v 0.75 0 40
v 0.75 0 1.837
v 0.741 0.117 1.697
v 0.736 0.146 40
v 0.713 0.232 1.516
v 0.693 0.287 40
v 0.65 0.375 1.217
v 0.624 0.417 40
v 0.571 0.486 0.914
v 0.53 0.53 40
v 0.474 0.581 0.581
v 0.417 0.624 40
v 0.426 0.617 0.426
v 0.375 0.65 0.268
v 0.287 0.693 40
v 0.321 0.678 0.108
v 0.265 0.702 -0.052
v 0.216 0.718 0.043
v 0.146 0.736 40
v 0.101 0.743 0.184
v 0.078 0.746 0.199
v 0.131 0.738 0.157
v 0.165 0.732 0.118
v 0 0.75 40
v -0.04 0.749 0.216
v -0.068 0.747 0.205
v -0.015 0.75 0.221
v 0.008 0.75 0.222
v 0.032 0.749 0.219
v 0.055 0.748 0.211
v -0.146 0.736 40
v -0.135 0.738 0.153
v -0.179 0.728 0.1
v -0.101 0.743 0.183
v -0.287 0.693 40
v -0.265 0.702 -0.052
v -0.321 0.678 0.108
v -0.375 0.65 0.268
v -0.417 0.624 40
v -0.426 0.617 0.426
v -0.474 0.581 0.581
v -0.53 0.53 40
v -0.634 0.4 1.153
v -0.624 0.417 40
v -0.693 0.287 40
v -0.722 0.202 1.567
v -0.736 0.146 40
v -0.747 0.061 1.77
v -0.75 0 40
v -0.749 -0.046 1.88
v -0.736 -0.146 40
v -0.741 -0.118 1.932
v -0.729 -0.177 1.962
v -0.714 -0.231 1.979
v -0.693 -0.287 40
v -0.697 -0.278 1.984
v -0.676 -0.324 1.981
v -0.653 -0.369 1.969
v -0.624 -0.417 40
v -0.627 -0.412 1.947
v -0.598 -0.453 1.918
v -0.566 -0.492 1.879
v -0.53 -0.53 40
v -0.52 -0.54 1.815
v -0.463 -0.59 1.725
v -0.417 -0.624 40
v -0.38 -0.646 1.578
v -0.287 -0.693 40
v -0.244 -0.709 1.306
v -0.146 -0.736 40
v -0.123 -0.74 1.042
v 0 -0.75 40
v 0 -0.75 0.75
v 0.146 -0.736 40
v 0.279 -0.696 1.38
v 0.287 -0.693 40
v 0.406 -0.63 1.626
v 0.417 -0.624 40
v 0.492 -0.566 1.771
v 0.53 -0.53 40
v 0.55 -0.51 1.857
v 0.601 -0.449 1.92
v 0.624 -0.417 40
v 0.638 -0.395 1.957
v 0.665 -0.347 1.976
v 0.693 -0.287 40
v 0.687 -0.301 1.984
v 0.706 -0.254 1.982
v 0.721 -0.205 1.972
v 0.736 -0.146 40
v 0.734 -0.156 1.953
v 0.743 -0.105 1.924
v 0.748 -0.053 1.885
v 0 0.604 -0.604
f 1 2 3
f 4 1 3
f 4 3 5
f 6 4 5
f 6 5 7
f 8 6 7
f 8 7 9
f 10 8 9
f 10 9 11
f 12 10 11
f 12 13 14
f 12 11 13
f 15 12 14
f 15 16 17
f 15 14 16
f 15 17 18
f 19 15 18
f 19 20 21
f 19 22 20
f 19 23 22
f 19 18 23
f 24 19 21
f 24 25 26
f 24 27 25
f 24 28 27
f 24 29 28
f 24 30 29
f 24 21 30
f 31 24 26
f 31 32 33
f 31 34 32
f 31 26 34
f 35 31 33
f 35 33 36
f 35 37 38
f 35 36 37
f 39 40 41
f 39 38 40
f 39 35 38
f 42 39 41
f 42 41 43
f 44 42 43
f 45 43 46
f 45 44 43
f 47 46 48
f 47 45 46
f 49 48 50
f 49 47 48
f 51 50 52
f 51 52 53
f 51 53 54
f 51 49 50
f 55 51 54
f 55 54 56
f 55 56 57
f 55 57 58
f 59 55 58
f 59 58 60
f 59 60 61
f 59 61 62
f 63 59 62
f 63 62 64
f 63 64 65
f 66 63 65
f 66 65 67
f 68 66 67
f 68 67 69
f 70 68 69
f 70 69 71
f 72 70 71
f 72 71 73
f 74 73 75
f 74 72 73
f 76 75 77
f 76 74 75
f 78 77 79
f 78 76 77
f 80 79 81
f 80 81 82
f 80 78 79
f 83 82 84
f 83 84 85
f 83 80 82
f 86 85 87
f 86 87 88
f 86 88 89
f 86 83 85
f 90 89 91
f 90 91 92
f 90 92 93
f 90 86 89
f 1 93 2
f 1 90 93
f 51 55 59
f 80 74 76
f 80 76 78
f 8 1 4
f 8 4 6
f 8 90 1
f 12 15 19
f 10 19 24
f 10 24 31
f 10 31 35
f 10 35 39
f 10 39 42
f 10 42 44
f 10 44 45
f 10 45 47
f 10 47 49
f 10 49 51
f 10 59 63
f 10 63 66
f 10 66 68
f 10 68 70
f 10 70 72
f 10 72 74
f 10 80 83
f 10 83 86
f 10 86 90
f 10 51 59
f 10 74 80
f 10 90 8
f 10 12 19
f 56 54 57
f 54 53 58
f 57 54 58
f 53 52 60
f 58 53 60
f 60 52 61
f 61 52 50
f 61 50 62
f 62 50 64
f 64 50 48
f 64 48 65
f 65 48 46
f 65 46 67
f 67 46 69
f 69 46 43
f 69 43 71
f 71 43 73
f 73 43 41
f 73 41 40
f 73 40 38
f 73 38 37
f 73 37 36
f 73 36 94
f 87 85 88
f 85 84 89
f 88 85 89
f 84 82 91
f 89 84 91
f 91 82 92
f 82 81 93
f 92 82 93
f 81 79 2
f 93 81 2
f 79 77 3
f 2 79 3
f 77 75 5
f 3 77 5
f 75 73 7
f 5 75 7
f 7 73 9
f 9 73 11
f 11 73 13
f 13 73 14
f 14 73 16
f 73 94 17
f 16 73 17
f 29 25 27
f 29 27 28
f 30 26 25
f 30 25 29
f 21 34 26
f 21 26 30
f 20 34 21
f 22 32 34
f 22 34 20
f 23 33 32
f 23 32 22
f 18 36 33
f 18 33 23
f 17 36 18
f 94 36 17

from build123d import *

# Parameters (mm, degrees)
F0_R          = 0.75
F1_DEPTH      = 40
F1_DEPTH_BACK = 5
F4_DEPTH      = 28.8156013334
F4_DEPTH_BACK = 4.0668639918
F6_W          = 6.4407079129
F6_H          = 2.7354915243
F7_DEPTH      = 0.869841948
F7_DEPTH_BACK = 39.5235462537


with BuildPart() as f1:
    # F0 (on Top) → F1 (new body, two sides)
    with BuildSketch(Plane.XY) as f1_sk:
        Circle(F0_R)
    extrude(amount=F1_DEPTH)
    extrude(f1_sk.sketch, amount=-F1_DEPTH_BACK)

    # F3 (on line) → F4 (cut, two sides)
    with BuildSketch(Plane(origin=(0, 0, 0), x_dir=(1, 0, 0), z_dir=(0, 0.7071067812, -0.7071067812))) as f4_sk:
        Polygon((-3.5966049702, -6.2295025431), (0, 0), (3.5966049702, -6.2295025431), (3.5966049702, 7.7731425289), (-3.5966049702, 7.7731425289), align=None)
    extrude(amount=-F4_DEPTH, mode=Mode.SUBTRACT)
    extrude(f4_sk.sketch, amount=F4_DEPTH_BACK, mode=Mode.SUBTRACT)

    # F6 (on face) → F7 (cut, two sides)
    with BuildSketch(Plane(origin=(0, 0, 0), x_dir=(1, 0, 0), z_dir=(0, -0.1736481777, -0.984807753))) as f7_sk:
        with Locations((-0.1402113121, -2.0677457621)):
            Rectangle(F6_W, F6_H)
    extrude(amount=F7_DEPTH, mode=Mode.SUBTRACT)
    extrude(f7_sk.sketch, amount=-F7_DEPTH_BACK, mode=Mode.SUBTRACT)


solid = f1.part
